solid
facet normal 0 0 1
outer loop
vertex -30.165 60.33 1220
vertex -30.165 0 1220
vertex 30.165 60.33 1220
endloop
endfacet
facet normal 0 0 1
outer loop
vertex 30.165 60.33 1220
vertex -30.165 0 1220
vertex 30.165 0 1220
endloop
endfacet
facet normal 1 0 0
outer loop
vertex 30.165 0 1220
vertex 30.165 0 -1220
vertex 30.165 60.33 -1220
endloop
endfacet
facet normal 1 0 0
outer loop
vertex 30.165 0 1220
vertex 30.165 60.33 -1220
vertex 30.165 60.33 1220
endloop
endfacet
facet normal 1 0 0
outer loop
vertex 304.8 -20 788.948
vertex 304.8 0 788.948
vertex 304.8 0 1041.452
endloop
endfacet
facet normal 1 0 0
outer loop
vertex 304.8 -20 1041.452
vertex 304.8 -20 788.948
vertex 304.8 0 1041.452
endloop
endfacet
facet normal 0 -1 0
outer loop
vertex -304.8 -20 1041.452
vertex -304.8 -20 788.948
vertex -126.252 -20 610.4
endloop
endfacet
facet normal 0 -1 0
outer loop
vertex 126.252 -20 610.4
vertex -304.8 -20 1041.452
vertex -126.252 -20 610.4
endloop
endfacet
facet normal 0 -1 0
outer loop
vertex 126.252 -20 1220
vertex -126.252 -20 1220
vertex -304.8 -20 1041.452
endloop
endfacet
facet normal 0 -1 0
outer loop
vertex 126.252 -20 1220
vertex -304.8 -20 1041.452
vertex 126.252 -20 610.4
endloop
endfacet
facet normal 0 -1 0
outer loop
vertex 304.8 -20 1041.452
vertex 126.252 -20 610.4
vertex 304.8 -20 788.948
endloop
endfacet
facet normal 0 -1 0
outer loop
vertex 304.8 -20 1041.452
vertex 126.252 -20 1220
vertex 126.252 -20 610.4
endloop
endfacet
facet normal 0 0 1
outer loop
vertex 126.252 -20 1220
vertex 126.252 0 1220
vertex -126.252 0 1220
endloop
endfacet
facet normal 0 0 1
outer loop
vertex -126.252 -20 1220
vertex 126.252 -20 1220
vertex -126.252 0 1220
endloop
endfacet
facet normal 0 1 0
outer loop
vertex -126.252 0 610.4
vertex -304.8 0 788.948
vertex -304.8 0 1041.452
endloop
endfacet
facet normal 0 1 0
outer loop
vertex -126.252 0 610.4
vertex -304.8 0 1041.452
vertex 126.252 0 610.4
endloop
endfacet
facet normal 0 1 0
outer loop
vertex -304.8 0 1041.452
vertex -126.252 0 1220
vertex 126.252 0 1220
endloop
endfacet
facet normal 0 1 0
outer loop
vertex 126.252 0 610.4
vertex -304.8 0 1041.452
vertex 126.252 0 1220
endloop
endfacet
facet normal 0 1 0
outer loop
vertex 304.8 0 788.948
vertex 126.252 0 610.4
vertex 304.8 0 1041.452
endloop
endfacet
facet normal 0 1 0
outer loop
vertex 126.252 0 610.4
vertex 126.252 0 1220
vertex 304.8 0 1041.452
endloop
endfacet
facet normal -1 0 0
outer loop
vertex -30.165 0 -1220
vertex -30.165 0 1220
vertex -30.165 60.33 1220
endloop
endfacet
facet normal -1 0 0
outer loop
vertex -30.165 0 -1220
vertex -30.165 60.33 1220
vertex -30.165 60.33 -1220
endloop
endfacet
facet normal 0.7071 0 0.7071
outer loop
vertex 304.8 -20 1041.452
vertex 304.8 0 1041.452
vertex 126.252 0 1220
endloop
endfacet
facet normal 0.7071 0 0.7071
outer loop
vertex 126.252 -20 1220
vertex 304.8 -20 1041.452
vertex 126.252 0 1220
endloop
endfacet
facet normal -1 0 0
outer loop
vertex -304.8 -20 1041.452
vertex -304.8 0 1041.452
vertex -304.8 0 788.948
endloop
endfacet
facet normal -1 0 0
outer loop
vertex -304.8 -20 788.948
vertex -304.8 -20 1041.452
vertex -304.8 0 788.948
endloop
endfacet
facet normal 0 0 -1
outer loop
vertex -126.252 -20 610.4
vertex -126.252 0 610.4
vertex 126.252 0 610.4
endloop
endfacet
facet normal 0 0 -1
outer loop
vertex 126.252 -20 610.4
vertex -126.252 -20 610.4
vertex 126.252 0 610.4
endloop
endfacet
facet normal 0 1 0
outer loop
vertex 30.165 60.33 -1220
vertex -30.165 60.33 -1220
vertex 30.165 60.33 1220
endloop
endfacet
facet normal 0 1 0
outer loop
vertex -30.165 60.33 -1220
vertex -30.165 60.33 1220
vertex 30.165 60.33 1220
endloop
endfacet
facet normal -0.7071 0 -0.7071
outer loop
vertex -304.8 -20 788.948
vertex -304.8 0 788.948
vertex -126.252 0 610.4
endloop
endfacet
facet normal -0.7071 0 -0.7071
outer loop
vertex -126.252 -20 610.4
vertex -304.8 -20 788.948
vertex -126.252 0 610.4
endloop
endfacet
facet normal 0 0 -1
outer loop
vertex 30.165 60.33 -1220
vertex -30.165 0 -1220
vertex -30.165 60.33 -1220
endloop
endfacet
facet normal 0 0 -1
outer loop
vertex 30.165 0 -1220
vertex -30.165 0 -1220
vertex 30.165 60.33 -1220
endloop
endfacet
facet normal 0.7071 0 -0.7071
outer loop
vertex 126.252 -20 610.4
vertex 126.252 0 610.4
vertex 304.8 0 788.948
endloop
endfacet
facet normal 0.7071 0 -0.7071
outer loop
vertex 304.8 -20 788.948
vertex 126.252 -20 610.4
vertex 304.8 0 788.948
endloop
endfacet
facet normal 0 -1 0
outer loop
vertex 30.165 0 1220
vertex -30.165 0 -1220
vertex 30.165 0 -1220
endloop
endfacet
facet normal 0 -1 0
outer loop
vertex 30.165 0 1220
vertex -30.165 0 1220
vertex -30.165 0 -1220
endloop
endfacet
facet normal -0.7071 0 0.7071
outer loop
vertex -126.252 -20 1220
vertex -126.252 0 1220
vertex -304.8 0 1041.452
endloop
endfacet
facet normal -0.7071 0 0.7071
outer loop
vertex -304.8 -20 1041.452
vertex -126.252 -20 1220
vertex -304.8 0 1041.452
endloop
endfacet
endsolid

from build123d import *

# Parameters (mm, degrees)
F1_W     = 60.33
F1_H     = 609.6
F2_DEPTH = 20
F1_H_2   = 1830.4
F3_DEPTH = 60.33


with BuildPart() as f2:
    # F1 (on Front) → F2 (new body)
    with BuildSketch(Plane.XZ):
        with Locations((0, 915.2)):
            Rectangle(F1_W, F1_H)
        Polygon((-30.165, 610.4), (-30.165, 1220), (-126.252294, 1220), (-304.8, 1041.452294), (-304.8, 788.947706), (-126.252294, 610.4), align=None)
        Polygon((126.252294, 1220), (30.165, 1220), (30.165, 610.4), (126.252294, 610.4), (304.8, 788.947706), (304.8, 1041.452294), align=None)
    extrude(amount=F2_DEPTH)


with BuildPart() as f3:
    # F1 (on Front) → F3 (new body)
    with BuildSketch(Plane.XZ):
        with Locations((0, -304.8)):
            Rectangle(F1_W, F1_H_2)
        with Locations((0, 915.2)):
            Rectangle(F1_W, F1_H)
    extrude(amount=-F3_DEPTH)


solid = Compound([f2.part, f3.part])
